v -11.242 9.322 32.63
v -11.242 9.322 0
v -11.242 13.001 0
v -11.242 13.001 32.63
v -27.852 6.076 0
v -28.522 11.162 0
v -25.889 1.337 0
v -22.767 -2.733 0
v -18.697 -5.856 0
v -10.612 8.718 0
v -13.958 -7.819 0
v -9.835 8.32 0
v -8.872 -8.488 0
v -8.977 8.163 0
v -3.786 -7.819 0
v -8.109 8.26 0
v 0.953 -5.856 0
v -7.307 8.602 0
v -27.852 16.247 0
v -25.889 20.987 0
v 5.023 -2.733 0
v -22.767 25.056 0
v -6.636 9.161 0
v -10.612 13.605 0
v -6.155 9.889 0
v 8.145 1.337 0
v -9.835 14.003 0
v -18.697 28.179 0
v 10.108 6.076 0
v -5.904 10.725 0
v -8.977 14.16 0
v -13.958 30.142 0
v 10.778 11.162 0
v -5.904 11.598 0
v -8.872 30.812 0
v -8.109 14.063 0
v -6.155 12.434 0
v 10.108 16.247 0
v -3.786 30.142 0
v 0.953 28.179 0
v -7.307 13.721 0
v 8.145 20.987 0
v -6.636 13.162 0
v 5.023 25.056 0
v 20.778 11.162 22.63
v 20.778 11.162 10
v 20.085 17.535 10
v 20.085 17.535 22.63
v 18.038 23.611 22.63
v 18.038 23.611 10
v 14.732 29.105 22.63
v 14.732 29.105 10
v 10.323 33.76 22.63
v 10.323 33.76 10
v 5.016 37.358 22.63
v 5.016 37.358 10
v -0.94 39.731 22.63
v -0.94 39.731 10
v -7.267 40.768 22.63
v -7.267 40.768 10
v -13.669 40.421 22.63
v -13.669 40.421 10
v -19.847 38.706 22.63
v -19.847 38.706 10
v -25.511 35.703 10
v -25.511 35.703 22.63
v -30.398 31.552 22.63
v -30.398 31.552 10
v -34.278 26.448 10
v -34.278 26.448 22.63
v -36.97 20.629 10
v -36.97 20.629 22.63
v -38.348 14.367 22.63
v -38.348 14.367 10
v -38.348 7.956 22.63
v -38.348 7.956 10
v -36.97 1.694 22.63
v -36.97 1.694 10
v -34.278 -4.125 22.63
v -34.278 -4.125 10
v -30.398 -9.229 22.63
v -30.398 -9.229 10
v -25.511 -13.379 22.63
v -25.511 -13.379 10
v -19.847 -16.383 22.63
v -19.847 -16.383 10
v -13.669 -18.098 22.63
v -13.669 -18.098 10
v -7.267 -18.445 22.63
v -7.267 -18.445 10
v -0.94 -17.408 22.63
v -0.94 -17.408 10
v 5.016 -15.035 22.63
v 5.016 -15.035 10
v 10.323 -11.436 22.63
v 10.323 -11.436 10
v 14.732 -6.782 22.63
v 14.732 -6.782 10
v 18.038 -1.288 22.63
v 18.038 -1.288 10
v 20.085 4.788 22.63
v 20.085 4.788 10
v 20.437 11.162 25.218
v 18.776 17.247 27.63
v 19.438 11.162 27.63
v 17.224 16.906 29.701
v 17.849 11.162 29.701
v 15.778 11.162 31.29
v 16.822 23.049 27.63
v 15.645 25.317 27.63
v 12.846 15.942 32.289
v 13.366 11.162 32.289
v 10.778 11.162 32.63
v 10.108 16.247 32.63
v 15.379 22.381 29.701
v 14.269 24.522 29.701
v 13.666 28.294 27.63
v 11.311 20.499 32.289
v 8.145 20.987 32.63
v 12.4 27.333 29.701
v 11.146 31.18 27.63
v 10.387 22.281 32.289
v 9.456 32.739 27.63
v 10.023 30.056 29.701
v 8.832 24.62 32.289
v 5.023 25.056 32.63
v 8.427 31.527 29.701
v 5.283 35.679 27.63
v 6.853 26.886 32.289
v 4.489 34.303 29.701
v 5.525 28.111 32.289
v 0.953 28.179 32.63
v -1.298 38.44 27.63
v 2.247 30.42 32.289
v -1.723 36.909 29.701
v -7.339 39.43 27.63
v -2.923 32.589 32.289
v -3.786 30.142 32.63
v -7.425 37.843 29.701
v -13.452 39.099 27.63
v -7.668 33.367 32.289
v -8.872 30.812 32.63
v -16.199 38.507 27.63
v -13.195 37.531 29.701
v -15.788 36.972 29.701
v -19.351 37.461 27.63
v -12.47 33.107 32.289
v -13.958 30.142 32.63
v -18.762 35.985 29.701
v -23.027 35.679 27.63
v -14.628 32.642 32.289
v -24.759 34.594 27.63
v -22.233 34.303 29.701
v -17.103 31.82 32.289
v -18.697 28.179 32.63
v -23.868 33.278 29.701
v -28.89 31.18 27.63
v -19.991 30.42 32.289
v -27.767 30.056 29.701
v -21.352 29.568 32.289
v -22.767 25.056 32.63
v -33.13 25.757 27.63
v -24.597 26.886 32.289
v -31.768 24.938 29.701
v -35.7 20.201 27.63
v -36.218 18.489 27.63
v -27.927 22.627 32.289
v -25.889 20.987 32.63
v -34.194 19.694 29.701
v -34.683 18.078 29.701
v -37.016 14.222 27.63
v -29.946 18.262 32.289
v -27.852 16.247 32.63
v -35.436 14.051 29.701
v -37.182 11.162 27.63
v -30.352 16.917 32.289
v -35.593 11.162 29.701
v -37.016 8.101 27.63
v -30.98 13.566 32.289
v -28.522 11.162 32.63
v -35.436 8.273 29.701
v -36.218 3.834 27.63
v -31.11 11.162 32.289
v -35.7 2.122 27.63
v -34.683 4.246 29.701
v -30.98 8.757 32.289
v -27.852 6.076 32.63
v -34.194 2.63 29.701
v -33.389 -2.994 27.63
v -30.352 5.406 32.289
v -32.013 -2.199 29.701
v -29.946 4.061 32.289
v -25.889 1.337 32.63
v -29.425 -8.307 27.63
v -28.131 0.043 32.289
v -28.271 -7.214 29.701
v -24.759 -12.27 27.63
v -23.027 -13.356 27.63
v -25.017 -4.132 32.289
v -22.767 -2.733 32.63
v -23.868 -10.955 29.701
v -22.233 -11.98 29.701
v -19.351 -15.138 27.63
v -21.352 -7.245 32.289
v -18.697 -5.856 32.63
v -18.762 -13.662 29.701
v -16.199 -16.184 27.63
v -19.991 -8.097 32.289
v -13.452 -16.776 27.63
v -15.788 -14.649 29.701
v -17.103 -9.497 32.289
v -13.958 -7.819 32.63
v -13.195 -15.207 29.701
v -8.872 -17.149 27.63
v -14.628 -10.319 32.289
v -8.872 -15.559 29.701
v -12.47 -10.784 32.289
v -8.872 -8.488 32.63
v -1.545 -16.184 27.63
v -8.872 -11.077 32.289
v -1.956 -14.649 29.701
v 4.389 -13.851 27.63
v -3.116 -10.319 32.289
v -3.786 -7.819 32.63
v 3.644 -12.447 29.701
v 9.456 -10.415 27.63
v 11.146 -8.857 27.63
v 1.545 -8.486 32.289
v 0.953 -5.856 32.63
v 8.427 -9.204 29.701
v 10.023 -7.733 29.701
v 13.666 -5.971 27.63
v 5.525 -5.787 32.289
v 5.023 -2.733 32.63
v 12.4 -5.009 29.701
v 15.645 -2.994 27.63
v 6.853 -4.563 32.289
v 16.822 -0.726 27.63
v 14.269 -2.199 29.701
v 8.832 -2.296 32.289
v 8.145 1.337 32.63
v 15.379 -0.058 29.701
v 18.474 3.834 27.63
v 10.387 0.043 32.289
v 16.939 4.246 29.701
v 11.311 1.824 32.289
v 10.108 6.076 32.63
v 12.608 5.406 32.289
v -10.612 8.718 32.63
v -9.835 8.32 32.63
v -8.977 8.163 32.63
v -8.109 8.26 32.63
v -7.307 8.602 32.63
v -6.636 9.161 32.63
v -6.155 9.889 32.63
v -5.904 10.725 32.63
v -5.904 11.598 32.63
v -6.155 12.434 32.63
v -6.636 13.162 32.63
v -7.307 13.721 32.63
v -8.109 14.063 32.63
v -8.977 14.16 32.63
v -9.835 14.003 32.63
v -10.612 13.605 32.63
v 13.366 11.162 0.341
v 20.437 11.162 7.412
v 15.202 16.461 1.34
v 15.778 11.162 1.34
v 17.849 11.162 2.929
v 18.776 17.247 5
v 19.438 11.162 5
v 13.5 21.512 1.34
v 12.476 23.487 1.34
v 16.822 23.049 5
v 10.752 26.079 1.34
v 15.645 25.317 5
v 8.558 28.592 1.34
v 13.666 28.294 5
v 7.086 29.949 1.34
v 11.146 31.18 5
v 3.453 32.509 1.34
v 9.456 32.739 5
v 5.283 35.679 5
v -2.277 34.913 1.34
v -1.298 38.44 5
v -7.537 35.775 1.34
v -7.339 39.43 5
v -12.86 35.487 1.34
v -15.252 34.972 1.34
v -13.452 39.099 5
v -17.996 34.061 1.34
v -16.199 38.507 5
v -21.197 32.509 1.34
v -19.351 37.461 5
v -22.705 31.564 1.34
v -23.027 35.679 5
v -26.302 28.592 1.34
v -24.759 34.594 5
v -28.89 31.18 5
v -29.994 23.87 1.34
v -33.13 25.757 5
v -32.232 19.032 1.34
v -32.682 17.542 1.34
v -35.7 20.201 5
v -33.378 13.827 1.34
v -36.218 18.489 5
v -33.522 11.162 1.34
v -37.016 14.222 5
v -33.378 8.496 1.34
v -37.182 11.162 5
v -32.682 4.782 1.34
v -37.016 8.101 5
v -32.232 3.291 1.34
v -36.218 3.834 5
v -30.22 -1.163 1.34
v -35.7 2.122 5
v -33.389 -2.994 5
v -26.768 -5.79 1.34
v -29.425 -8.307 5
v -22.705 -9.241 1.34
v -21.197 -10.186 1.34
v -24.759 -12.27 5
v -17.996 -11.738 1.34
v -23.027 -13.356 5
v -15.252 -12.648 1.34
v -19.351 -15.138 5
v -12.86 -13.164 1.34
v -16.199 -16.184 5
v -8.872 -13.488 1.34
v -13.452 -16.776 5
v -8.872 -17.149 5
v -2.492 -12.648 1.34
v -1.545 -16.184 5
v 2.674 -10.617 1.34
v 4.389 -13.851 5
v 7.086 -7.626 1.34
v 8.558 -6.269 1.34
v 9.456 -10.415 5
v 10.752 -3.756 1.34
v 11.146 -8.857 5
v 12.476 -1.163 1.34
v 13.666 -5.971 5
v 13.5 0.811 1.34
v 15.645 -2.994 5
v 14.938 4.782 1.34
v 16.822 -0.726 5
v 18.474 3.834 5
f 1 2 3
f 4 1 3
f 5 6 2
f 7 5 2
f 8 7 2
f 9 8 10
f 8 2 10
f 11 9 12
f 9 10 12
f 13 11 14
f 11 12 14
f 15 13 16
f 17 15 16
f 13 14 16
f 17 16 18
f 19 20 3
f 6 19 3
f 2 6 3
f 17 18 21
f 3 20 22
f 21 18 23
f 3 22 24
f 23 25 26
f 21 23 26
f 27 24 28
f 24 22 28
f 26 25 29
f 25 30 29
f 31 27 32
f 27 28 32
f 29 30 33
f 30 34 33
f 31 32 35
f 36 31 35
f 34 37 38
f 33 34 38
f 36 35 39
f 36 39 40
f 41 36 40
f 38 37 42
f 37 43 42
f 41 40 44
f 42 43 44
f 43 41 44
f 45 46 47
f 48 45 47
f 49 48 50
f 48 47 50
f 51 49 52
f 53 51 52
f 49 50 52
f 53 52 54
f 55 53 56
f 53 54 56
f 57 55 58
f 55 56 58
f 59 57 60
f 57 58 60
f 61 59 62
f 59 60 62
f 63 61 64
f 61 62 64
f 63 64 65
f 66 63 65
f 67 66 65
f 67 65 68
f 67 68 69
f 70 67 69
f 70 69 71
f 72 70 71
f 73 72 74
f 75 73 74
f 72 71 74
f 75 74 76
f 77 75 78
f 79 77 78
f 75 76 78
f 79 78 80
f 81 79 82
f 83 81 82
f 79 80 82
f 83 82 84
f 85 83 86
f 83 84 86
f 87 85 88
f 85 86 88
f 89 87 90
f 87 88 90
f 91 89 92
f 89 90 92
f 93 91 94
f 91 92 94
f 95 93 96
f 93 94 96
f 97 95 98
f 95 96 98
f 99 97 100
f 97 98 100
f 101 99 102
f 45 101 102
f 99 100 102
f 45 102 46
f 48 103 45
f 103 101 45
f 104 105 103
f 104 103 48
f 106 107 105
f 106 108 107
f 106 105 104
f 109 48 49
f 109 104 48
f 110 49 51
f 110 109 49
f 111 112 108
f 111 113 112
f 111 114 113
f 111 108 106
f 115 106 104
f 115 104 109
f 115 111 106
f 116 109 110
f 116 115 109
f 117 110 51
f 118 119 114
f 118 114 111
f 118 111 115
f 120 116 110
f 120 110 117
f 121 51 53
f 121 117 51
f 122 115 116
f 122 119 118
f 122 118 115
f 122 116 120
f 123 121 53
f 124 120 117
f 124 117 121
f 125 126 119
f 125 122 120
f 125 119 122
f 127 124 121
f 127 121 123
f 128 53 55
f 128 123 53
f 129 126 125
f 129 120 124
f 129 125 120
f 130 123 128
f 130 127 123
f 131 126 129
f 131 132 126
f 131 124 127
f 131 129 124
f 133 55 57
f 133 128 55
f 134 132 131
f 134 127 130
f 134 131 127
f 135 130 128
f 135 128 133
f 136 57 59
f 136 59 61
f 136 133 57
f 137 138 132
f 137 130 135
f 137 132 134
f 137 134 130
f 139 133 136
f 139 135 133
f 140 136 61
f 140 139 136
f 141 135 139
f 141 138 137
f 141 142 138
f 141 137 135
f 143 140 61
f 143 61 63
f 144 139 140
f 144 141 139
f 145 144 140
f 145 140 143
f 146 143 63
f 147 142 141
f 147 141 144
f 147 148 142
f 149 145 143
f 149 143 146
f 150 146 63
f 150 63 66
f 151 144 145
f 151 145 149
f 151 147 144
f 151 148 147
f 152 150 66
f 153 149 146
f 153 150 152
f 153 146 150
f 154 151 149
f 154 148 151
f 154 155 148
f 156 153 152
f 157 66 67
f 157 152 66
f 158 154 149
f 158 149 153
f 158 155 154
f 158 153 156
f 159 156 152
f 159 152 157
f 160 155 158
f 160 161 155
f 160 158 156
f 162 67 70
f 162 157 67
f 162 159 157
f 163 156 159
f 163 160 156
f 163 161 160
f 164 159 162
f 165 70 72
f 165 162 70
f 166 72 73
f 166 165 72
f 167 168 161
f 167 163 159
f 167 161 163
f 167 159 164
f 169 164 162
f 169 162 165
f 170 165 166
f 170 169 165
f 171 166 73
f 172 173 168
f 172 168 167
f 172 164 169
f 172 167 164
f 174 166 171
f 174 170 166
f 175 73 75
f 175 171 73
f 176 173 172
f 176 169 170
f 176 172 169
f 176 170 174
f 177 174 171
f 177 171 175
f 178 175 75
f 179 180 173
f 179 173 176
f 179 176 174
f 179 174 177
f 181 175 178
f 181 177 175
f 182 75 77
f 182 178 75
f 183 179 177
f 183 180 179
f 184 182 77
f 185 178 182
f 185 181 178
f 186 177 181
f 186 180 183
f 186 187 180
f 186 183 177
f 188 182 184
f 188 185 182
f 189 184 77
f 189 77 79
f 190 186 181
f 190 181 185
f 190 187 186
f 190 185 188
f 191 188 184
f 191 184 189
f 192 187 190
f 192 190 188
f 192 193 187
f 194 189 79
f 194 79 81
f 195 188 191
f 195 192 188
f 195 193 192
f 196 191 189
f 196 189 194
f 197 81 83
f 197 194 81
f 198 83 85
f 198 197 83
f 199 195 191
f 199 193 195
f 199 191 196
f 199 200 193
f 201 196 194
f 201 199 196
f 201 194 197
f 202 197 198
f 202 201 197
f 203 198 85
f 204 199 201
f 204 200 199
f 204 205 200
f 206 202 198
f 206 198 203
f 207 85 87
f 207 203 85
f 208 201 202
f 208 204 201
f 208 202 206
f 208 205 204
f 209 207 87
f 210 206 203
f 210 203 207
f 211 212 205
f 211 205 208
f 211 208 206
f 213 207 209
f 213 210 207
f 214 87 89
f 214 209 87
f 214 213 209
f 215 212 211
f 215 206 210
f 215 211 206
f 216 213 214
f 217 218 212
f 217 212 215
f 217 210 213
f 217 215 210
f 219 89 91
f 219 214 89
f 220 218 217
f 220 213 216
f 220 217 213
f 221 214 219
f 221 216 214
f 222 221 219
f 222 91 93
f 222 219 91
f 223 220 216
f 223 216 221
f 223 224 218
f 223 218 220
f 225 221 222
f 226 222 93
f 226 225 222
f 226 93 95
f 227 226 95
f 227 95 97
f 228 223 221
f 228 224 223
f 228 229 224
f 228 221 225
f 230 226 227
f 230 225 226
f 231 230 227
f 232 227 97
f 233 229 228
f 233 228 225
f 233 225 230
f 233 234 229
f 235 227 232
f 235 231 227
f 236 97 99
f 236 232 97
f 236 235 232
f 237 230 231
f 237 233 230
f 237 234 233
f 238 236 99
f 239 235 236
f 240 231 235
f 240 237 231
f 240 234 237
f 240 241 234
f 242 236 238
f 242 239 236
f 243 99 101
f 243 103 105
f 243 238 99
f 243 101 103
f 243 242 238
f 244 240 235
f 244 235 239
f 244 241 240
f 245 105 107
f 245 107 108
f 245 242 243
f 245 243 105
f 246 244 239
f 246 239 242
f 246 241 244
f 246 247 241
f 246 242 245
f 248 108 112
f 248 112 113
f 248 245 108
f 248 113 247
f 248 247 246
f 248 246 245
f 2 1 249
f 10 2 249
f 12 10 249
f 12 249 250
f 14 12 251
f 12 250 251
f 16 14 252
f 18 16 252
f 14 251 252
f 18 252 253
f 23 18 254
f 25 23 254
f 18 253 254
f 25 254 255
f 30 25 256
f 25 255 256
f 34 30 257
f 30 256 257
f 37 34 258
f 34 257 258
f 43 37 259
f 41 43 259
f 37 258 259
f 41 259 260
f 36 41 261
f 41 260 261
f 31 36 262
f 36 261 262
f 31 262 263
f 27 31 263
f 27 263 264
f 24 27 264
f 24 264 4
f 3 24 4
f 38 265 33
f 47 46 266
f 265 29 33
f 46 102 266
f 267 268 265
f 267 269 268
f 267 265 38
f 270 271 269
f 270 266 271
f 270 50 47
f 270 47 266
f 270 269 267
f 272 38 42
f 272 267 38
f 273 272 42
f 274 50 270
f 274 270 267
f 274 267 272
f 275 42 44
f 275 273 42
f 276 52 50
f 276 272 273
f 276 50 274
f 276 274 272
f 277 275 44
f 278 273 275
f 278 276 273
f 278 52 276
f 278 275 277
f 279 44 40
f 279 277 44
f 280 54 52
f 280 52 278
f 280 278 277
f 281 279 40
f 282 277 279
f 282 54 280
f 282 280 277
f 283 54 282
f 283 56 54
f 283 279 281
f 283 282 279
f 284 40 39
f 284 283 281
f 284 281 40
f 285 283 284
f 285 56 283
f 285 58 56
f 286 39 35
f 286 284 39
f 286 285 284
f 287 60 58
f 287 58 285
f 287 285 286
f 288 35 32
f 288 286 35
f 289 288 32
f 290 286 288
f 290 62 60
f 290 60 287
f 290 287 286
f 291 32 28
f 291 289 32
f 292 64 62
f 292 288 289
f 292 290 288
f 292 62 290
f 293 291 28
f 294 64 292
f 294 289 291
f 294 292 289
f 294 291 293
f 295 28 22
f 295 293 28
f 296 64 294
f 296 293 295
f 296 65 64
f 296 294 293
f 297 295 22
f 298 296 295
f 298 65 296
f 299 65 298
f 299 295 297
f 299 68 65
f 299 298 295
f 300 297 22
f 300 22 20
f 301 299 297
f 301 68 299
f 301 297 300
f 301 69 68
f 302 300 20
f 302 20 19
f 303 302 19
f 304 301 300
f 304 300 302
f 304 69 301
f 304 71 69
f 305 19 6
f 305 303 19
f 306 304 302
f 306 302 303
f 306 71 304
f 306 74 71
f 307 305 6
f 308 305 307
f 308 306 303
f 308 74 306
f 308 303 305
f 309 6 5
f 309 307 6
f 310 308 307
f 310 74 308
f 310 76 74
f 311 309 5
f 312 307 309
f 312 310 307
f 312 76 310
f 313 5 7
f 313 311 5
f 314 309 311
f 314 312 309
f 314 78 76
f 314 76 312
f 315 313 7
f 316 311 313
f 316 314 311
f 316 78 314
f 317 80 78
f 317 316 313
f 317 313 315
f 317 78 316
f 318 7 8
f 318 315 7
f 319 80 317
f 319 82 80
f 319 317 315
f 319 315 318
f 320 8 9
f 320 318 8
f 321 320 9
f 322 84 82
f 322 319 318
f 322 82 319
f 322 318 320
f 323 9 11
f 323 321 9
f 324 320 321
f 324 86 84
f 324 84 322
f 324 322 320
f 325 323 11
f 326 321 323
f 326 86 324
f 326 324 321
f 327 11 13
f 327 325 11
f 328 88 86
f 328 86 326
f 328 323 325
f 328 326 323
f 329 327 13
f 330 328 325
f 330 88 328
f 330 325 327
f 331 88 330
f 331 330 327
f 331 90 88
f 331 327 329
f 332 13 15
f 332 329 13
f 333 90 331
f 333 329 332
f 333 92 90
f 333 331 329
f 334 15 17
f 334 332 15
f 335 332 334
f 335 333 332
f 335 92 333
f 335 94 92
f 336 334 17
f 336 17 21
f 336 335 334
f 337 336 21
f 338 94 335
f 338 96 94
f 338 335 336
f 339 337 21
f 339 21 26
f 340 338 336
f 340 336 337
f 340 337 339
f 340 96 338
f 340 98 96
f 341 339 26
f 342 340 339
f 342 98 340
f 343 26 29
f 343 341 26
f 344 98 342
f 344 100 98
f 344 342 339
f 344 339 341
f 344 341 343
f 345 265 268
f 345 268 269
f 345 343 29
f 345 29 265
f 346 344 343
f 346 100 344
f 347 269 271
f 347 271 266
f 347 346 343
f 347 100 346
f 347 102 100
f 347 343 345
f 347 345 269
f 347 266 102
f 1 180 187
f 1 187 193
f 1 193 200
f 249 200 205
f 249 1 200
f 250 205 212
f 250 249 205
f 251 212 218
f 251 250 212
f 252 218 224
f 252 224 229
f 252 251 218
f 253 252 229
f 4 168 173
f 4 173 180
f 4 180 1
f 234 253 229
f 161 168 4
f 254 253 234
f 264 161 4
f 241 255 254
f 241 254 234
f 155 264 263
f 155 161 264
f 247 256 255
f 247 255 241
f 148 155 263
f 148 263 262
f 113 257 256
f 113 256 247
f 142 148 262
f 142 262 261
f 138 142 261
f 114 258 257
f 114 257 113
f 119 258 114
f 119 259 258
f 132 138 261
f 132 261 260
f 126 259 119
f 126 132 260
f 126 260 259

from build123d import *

# Parameters (mm, degrees)
ESQUISSE1_R             = 29.65
BOSS_EXTRU_1_DEPTH      = 32.63
ESQUISSE3_R             = 3
ENL_V_MAT_EXTRU_1_DEPTH = 33.63
ESQUISSE4_W             = 2.697553301
ESQUISSE4_H             = 5.967314877
BOSS_EXTRU_4_DEPTH      = 32.63
CONG_1_R                = 10
CONG_2_R                = 10


with BuildPart() as part:
    # Esquisse1 → Boss.-Extru.1 (new body)
    with BuildSketch(Plane.XY):
        with Locations((-8.87201182, 11.161610959)):
            Circle(ESQUISSE1_R)
    extrude(amount=BOSS_EXTRU_1_DEPTH)

    # Esquisse3 → Enlèv. mat.-Extru.1 (cut)
    with BuildSketch(Plane.XY.offset(32.63)):
        with Locations((-8.87201182, 11.161610959)):
            Circle(ESQUISSE3_R)
    extrude(amount=-ENL_V_MAT_EXTRU_1_DEPTH, mode=Mode.SUBTRACT)

    # Esquisse4 → Boss.-Extru.4 (add)
    with BuildSketch(Plane.XY.offset(32.63)):
        with Locations((-12.590788471, 11.037032126)):
            Rectangle(ESQUISSE4_W, ESQUISSE4_H)
    extrude(amount=-BOSS_EXTRU_4_DEPTH)

    # Congé1
    cong_1_edges = [part.edges().sort_by_distance(p)[0] for p in [
        (-38.52201182, 11.161610959, 0),
    ]]
    fillet(cong_1_edges, radius=CONG_1_R)

    # Congé2
    cong_2_edges = [part.edges().sort_by_distance(p)[0] for p in [
        (-38.52201182, 11.161610959, 32.63),
    ]]
    fillet(cong_2_edges, radius=CONG_2_R)


solid = part.part
